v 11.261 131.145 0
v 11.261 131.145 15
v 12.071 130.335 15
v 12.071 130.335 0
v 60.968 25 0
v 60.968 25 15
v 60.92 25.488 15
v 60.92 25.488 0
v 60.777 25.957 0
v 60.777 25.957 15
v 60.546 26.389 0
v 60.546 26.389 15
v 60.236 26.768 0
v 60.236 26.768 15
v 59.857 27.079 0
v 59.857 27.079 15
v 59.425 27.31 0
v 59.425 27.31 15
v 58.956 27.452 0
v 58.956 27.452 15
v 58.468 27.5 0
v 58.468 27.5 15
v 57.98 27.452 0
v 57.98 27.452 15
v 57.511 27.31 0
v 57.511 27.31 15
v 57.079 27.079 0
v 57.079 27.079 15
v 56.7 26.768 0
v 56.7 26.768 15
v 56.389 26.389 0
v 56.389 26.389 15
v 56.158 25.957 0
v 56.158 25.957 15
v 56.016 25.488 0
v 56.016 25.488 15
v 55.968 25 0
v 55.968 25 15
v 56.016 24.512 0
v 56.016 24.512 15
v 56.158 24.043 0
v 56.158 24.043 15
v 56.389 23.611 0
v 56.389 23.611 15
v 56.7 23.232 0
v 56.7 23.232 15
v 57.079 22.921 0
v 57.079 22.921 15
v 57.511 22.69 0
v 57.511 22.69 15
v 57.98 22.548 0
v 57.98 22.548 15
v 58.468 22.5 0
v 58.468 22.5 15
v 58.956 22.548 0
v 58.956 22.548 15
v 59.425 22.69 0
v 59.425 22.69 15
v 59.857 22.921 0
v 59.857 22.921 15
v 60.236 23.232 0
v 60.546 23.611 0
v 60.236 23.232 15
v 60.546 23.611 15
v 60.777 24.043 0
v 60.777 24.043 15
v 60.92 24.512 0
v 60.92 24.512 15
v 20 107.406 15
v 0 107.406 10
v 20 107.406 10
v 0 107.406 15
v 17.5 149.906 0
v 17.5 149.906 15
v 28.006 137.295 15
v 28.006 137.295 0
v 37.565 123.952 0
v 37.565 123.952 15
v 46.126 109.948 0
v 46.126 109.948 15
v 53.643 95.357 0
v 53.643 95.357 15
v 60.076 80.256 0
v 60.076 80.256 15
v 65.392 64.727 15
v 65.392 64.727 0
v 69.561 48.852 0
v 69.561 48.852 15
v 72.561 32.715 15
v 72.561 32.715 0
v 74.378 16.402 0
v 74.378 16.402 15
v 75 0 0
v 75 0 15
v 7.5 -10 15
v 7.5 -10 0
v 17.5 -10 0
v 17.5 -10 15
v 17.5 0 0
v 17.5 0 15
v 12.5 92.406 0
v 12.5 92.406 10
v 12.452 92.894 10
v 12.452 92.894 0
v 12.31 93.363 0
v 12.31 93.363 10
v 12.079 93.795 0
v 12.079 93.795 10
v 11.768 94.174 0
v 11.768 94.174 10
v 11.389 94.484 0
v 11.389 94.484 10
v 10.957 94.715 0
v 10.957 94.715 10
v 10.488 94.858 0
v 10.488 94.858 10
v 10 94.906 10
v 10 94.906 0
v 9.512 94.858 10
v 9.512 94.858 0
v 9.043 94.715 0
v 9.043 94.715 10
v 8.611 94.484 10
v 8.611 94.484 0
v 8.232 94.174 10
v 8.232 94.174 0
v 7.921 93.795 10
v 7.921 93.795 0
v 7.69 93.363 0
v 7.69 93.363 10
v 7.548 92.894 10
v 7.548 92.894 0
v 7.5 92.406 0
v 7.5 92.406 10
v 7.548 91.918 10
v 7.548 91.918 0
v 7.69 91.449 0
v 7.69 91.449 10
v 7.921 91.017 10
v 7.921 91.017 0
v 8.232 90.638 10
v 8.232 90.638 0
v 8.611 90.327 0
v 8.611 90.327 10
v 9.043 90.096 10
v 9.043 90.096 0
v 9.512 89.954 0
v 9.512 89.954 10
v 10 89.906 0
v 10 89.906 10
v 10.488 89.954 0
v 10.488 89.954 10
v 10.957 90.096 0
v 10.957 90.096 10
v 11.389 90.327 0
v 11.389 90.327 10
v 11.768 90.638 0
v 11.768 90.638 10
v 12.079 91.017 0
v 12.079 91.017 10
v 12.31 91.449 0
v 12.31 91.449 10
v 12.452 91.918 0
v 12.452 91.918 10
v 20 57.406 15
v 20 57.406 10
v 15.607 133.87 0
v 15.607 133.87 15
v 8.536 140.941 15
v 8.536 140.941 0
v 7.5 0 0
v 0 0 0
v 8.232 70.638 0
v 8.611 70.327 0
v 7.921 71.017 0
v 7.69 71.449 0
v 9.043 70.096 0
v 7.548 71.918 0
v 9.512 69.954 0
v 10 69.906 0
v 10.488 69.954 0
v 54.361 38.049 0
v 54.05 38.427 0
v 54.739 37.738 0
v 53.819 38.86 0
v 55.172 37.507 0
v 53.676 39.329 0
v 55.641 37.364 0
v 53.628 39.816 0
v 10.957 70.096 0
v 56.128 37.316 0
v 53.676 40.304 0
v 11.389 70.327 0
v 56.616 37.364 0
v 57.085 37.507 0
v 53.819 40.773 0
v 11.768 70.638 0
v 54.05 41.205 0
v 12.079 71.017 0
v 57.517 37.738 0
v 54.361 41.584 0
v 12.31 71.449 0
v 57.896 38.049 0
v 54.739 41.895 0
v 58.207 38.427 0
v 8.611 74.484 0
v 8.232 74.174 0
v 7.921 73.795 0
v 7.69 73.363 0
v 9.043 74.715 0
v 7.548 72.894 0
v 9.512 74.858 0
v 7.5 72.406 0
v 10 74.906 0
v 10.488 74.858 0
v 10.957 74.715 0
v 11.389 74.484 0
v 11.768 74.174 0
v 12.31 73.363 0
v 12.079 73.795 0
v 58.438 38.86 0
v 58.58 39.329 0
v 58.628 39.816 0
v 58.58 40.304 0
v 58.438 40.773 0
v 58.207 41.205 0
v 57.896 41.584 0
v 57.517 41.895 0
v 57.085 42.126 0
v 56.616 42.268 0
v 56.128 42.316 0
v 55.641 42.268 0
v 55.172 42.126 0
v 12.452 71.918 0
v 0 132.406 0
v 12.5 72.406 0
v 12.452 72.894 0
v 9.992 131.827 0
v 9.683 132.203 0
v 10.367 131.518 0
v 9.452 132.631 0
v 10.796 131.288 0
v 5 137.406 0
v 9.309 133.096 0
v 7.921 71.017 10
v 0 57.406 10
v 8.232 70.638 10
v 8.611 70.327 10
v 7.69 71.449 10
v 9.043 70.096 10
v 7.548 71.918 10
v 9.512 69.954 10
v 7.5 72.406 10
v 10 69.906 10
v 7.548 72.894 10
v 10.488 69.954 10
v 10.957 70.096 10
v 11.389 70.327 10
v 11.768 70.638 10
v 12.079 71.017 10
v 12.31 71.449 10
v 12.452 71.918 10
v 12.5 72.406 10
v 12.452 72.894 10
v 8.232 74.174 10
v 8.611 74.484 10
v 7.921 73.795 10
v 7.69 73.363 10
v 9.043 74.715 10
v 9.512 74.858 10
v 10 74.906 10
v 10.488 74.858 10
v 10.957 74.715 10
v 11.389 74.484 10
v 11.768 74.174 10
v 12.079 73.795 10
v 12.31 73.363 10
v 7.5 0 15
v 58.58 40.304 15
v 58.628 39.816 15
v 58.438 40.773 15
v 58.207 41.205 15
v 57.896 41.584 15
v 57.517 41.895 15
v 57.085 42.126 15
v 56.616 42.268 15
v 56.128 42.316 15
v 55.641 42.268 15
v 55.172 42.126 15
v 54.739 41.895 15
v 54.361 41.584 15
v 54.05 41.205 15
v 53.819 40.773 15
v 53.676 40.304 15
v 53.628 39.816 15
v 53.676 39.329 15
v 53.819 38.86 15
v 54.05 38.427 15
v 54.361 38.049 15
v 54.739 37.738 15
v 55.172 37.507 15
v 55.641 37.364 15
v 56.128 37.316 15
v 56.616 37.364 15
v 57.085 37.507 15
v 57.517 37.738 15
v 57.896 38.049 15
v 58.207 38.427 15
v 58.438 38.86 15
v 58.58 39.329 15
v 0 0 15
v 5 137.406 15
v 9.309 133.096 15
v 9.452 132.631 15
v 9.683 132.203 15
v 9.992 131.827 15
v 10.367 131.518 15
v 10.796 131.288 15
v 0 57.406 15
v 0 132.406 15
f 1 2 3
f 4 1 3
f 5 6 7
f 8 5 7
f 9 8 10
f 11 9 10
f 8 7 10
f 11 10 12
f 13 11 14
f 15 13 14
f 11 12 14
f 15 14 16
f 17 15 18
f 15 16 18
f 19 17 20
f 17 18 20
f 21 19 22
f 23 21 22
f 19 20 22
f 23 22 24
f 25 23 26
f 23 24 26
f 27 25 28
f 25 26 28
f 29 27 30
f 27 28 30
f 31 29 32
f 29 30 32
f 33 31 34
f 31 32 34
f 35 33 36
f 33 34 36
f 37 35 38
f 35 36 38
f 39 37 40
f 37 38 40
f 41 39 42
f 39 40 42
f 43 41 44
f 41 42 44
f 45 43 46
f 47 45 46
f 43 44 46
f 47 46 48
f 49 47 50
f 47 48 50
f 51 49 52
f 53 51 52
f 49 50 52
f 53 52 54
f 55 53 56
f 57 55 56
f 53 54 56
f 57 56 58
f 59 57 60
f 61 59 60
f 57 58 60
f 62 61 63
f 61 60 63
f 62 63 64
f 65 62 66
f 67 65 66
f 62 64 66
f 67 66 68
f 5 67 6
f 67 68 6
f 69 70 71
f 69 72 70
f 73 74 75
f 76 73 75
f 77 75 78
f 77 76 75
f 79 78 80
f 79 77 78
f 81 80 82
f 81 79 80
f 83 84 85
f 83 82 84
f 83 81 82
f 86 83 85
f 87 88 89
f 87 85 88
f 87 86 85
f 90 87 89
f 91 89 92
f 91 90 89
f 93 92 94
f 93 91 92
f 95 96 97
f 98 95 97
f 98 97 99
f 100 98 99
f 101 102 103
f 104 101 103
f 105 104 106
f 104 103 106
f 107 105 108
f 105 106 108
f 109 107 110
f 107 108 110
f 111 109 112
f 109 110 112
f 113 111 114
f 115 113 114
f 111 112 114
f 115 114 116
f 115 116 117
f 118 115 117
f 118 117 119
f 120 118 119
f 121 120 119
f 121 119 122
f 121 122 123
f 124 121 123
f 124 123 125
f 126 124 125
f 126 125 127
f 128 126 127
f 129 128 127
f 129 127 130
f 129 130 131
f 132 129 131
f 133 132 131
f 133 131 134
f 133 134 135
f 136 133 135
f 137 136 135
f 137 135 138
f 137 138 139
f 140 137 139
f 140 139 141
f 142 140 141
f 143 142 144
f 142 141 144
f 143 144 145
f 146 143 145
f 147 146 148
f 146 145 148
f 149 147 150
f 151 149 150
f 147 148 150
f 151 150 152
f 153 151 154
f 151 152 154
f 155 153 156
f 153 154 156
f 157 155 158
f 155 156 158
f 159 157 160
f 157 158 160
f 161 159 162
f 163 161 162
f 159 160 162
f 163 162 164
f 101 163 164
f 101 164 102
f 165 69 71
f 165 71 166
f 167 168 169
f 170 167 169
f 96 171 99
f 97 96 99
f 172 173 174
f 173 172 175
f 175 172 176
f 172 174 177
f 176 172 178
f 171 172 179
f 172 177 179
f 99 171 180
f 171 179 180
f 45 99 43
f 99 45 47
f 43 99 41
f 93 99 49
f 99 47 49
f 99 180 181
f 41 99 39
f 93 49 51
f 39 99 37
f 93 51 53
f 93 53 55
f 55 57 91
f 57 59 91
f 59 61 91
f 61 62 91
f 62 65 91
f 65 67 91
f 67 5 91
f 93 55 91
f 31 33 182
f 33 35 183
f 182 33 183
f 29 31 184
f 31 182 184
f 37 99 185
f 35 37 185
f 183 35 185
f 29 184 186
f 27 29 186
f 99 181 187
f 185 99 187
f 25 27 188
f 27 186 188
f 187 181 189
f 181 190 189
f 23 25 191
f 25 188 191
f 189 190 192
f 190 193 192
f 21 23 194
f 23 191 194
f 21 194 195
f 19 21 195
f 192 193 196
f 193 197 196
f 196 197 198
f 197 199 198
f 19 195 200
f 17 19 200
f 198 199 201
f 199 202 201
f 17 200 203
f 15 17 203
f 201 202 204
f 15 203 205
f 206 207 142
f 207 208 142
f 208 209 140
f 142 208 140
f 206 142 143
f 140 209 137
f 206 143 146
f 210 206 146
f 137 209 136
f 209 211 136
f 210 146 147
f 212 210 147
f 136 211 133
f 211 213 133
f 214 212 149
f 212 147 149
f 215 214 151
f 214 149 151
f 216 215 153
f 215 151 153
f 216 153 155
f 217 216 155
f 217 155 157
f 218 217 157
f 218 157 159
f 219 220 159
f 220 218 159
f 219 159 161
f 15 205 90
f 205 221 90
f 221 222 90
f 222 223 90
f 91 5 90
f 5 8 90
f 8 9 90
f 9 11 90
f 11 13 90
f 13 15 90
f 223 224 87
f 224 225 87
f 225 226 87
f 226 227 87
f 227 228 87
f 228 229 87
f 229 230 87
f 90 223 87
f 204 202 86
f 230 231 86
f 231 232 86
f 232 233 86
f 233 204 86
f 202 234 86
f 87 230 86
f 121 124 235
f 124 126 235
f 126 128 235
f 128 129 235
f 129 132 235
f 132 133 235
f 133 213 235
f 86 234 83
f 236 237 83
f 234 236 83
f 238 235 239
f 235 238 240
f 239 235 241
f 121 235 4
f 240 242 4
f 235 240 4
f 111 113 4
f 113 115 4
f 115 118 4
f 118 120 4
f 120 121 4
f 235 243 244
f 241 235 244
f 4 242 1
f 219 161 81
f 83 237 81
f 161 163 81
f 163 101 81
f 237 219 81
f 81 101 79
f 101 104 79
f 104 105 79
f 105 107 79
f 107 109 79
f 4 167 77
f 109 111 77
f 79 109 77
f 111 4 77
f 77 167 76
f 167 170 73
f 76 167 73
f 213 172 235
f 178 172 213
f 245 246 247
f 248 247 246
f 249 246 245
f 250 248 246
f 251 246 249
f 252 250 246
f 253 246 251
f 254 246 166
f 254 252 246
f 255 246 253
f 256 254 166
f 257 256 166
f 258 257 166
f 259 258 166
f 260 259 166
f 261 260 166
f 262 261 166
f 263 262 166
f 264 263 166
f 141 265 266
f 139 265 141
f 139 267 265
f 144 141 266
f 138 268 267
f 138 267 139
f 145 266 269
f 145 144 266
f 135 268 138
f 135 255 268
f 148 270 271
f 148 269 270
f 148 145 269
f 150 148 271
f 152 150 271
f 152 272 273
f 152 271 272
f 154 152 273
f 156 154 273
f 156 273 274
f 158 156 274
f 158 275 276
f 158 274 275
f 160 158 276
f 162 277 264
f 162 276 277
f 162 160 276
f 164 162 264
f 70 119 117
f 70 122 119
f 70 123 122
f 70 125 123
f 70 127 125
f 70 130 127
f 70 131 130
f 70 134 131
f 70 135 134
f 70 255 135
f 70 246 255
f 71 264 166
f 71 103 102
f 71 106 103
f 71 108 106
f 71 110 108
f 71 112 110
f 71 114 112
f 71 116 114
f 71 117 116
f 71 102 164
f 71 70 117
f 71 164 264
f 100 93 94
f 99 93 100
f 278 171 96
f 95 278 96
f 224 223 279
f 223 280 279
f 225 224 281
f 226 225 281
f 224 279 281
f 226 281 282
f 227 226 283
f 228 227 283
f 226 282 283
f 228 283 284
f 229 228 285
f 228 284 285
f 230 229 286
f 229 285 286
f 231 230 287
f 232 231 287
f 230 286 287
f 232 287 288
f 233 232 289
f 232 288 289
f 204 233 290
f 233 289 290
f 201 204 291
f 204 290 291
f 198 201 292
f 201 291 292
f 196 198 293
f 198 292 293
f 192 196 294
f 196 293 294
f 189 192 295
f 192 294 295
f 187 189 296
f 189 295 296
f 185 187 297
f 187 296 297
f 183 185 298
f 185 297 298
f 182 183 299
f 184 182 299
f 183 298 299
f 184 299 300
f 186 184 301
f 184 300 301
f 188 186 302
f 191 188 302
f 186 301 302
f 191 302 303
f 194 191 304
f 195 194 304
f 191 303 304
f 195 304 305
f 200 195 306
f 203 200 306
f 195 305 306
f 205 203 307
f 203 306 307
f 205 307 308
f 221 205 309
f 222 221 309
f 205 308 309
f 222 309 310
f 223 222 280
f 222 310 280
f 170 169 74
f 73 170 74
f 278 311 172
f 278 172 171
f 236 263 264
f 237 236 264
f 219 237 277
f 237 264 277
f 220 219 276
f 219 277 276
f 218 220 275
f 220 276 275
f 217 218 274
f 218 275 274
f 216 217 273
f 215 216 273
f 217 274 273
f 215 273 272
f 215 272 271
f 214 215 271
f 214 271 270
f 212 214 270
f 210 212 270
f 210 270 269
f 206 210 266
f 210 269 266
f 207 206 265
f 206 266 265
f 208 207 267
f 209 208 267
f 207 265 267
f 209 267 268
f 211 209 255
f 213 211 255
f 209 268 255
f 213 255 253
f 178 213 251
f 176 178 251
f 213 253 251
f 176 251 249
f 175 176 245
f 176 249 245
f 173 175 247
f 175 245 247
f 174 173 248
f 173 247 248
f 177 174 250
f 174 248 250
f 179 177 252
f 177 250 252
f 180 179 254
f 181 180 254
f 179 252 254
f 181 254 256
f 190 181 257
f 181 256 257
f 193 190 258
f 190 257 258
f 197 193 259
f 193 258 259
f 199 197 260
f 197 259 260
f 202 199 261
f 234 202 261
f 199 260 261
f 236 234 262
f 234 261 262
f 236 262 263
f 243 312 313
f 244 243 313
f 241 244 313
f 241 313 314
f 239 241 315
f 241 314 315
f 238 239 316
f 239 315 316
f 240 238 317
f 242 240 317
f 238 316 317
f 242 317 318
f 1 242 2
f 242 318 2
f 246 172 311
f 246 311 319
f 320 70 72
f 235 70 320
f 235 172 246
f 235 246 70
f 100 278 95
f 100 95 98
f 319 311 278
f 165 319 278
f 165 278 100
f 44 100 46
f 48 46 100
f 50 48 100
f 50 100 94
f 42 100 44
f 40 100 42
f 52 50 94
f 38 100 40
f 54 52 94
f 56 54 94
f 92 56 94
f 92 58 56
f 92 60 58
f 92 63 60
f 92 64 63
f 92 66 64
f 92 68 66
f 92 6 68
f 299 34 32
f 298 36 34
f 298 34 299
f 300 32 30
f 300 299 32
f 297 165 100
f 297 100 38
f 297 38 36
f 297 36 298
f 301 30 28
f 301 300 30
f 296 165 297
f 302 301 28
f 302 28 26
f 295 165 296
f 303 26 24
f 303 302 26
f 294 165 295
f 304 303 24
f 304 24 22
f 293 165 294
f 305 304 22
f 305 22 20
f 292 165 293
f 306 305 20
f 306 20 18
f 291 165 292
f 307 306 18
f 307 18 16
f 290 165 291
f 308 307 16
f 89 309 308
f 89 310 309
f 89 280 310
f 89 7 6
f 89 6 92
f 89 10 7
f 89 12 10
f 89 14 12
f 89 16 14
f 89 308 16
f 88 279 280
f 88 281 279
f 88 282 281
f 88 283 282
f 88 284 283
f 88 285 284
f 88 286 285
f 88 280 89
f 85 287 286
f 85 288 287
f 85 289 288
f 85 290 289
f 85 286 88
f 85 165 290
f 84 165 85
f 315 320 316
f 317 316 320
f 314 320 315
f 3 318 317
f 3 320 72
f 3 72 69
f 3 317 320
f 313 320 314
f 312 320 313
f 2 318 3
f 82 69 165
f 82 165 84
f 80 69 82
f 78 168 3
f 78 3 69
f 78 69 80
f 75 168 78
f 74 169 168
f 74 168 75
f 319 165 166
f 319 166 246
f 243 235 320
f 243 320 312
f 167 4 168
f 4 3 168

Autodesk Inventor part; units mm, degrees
ref_plane "YZ Plane" through (0, 0, 0) normal (1, 0, 0) x (0, 1, 0)
ref_plane "XZ Plane" through (0, 0, 0) normal (0, 1, 0) x (-1, 0, 0)
ref_plane "XY Plane" through (0, 0, 0) normal (0, 0, 1) x (1, 0, 0)
sketch "Sketch1" plane through (0, 0, 0) normal (0, 0, 1) x (1, 0, 0)
  circle A0 centre (-149.9998, -0.3235) radius 225 construction
  line L0 (0, 0) -> (0, 132.4058)
  line L1 (0, 132.4058) -> (17.5, 149.9058)
  line L2 (0, 132.4058) -> (24.7487, 132.4058) construction
  arc A1 (75, 0) -> (17.5, 149.9058) centre (-149.9998, -0.3235) ccw
  line L3 (75, 0) -> (25, 0)
  line L4 (25, 0) -> (17.5, 0)
  line L5 (0, 0) -> (7.5, 0)
  line L6 (7.5, 0) -> (7.5, -10)
  line L7 (7.5, -10) -> (17.5, -10)
  line L8 (17.5, -10) -> (17.5, 0)
  circle A2 centre (-149.9998, -0.3235) radius 200 construction
  line L9 (17.5, 149.9058) -> (17.5, 0)
  dimension "d0" = 75
  dimension "d1" = 450
  dimension "d3" = 45
  dimension "d37" = 50
  dimension "d38" = 7.5
  dimension "d39" = 7.5
  dimension "d40" = 10
  dimension "d41" = 25
  dimension "d79" = 149.9058
extrude "Extrusion1" add sketch "Sketch1" along normal blind 15
sketch "Sketch2" plane through (0, 0, 15) normal (0, 0, 1) x (1, 0, 0)
  circle A0 centre (58.4678, 25) radius 2.5
  circle A1 centre (56.1283, 39.8164) radius 2.5
  line L0 (0, 132.4058) -> (0, 0) projected
  line L1 (0, 0) -> (7.5, 0) projected
  line L2 (7.5, 0) -> (7.5, -10) projected
  line L3 (7.5, -10) -> (17.5, -10) projected
  line L4 (17.5, -10) -> (17.5, 0) projected
  line L5 (17.5, 0) -> (75, 0) projected
  arc A2 (75, 0) -> (17.5, 149.9058) centre (-149.9998, -0.3235) ccw projected
  line L6 (17.5, 149.9058) -> (0, 132.4058) projected
  arc A3 (59.4404, 15) -> (16.4825, 127.6751) centre (-149.9998, -0.3235) ccw construction
  line L7 (59.4404, 15) -> (17.5, 15) construction
  line L8 (17.5, 15) -> (15, 15) construction
  line L9 (15, 15) -> (15, 126.1926) construction
  line L10 (15, 126.1926) -> (16.4825, 127.6751) construction
  circle A4 centre (11.7593, 133.5945) radius 2.5
  circle A5 centre (-149.9998, -0.3235) radius 225 construction
  circle A6 centre (-149.9998, -0.3235) radius 210 construction
  dimension "d6" = 5
  dimension "d7" = 5
  dimension "d8" = 15
  dimension "d10" = 25
  dimension "d42" = 15
  dimension "d43" = 5
  dimension "d45" = 450
  dimension "d46" = 15
  dimension "d49" = 7.4745
extrude "Extrusion2" cut sketch "Sketch2" against normal through all contours A0 | A1 | A4
sketch "Sketch5" plane through (0, 0, 15) normal (0, 0, 1) x (1, 0, 0)
  line L0 (5, 137.4058) -> (12.0711, 130.3347)
  line L1 (5, 137.4058) -> (15, 137.4058) construction
  line L2 (12.0711, 130.3347) -> (15.6066, 133.8703)
  line L3 (15.6066, 133.8703) -> (8.5355, 140.9413)
  line L4 (8.5355, 140.9413) -> (5, 137.4058)
  line L5 (17.5, 149.9058) -> (0, 132.4058) projected
  point P0 (0, 0)
  dimension "d29" = 10
  dimension "d30" = 45
  dimension "d31" = 5
  dimension "d32" = 10
  dimension "d33" = 90
  dimension "d34" = 5
extrude "Extrusion3" cut sketch "Sketch5" against normal through all
thread "Thread1" size "M5x0.8" class "6H" standard "ANSI Metric M Profile" full length
thread "Thread2" size "M5x0.8" class "6H" standard "ANSI Metric M Profile" full length
thread "Thread3" size "M5x0.8" class "6H" standard "ANSI Metric M Profile" full length
sketch "Sketch6" plane through (0, 0, 15) normal (0, 0, 1) x (1, 0, 0)
  line L0 (0, 107.4058) -> (20, 107.4058) construction
  line L1 (20, 107.4058) -> (20, 57.4058) construction
  line L2 (20, 57.4058) -> (0, 57.4058) construction
  line L3 (0, 57.4058) -> (0, 107.4058) construction
  line L4 (8.5355, 140.9413) -> (15.6066, 133.8703) construction
  line L5 (15.6066, 133.8703) -> (12.0711, 130.3347) construction
  line L6 (9.3094, 133.0964) -> (5, 137.4058) construction
  line L7 (5, 137.4058) -> (0, 132.4058) construction
  line L8 (0, 132.4058) -> (0, 0) construction
  line L9 (0, 0) -> (7.5, 0) construction
  line L10 (7.5, 0) -> (7.5, -10) construction
  line L11 (7.5, -10) -> (17.5, -10) construction
  line L12 (17.5, -10) -> (17.5, 0) construction
  line L13 (17.5, 0) -> (75, 0) construction
  arc A0 (75, 0) -> (17.5, 149.9058) centre (-149.9998, -0.3235) ccw construction
  line L14 (17.5, 149.9058) -> (8.5355, 140.9413) construction
  arc A1 (9.3094, 133.0964) -> (11.2612, 131.1446) centre (11.7593, 133.5945) ccw construction
  circle A2 centre (58.4678, 25) radius 2.5 construction
  circle A3 centre (56.1283, 39.8164) radius 2.5 construction
  circle A4 centre (10, 92.4058) radius 2.5
  circle A5 centre (10, 72.4058) radius 2.5
  line L15 (0, 132.4058) -> (0, 0) projected
  line L16 (12.0711, 130.3347) -> (11.2612, 131.1446) projected
  dimension "d50" = 20
  dimension "d51" = 50
  dimension "d52" = 25
  dimension "d53" = 5
  dimension "d54" = 5
  dimension "d55" = 20
  dimension "d56" = 15
  dimension "d57" = 10
extrude "Extrusion4" cut sketch "Sketch6" against normal through all
thread "Thread4" size "M5x0.8" class "6H" standard "ANSI Metric M Profile" full length
thread "Thread5" size "M5x0.8" class "6H" standard "ANSI Metric M Profile" full length
sketch "Sketch9" plane through (0, 0, 15) normal (0, 0, 1) x (1, 0, 0)
  line L0 (0, 132.4058) -> (0, 0) projected
  line L1 (0, 107.4058) -> (20, 107.4058)
  line L2 (20, 107.4058) -> (20, 57.4058)
  line L3 (20, 57.4058) -> (0, 57.4058)
  line L4 (0, 57.4058) -> (0, 107.4058)
  dimension "d74" = 20
  dimension "d75" = 50
  dimension "d76" = 25
extrude "Extrusion7" cut sketch "Sketch9" against normal blind 5
properties part number "CP001" material "ABS Plastic"
